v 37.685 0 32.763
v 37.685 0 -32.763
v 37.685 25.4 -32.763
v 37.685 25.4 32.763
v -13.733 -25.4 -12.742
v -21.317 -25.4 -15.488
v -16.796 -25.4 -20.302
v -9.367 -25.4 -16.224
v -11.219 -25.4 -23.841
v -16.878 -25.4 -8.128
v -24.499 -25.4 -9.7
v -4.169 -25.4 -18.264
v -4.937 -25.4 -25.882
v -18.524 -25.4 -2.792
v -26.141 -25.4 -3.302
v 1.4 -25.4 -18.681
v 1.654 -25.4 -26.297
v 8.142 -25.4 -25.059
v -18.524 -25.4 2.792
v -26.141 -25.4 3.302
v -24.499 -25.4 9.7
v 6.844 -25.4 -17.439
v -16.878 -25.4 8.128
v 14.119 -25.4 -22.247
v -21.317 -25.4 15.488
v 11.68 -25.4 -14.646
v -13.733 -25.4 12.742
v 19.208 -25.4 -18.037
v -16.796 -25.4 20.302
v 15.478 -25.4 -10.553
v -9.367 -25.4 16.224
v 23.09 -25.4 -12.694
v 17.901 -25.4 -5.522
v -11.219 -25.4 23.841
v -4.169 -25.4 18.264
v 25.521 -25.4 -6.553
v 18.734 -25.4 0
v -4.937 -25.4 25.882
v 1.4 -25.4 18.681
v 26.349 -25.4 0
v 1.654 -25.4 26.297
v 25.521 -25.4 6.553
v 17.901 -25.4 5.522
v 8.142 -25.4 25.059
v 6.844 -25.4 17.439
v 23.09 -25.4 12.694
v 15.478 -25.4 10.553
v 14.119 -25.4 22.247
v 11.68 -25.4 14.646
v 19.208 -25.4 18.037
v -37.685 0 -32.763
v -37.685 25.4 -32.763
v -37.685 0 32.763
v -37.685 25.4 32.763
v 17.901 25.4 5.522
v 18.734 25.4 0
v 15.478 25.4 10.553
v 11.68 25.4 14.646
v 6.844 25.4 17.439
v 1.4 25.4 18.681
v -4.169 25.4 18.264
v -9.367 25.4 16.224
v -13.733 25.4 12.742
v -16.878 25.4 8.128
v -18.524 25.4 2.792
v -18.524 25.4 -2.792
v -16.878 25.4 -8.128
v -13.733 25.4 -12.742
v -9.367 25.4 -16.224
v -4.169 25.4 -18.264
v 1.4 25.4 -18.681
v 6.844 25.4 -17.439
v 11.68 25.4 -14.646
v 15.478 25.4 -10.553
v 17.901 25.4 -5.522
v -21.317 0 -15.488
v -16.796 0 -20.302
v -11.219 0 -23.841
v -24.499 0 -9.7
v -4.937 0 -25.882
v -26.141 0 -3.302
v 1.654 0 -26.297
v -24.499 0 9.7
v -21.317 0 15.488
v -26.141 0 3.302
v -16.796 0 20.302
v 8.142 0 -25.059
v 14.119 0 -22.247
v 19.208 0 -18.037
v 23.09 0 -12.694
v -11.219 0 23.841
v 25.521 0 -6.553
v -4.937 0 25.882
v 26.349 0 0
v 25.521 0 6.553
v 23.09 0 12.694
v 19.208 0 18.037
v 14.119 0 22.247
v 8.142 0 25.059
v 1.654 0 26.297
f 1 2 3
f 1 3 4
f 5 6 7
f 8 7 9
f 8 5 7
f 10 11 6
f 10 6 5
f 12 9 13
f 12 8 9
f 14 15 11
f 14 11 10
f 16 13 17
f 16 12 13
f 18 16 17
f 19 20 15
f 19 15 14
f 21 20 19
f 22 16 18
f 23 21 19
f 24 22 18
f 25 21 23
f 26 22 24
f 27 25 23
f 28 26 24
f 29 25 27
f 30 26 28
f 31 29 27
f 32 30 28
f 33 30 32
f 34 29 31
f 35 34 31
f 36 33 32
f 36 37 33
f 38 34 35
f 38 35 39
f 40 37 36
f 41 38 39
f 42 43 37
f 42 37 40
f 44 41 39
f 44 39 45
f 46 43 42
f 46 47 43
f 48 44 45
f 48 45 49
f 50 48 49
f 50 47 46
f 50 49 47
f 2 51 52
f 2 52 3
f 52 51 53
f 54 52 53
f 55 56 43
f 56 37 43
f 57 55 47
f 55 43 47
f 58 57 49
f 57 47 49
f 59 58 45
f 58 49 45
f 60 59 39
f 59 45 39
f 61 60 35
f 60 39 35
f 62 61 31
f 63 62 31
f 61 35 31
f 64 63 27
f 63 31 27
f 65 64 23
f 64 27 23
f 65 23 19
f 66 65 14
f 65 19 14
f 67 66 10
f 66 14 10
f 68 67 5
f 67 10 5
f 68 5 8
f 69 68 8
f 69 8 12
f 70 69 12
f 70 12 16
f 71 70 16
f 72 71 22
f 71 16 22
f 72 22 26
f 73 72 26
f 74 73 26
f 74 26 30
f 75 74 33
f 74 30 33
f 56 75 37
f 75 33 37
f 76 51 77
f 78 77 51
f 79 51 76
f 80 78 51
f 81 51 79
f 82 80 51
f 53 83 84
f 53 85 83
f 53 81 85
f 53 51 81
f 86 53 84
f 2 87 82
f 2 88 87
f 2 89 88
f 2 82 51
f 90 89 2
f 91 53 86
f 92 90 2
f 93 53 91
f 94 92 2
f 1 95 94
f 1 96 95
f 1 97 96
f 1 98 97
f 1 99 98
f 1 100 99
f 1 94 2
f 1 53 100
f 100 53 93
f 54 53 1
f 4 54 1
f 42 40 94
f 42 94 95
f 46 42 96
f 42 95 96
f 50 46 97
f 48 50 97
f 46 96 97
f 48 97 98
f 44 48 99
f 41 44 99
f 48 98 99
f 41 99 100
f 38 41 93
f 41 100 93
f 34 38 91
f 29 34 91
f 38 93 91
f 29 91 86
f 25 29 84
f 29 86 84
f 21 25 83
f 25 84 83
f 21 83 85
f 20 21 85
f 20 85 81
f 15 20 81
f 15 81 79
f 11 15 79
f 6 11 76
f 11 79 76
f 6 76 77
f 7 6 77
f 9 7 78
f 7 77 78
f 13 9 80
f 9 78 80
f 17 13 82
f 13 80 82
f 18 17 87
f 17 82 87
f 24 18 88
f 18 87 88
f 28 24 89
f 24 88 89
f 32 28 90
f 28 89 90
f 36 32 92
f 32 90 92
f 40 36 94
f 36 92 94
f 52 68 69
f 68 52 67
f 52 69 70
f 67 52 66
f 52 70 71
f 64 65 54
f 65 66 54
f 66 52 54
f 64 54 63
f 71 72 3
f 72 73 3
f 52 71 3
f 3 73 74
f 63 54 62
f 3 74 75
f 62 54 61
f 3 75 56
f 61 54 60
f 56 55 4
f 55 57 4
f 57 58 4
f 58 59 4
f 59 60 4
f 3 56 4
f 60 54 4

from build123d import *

# Parameters (mm, degrees)
F0_W     = 75.369708
F0_H     = 65.526642
F1_DEPTH = 25.4
F2_R     = 26.349112
F3_DEPTH = 25.4
F4_R     = 18.733501
F5_DEPTH = 25.401
F6_DEPTH = 25.401


with BuildPart() as f1:
    # F0 (on Front) → F1 (new body)
    with BuildSketch(Plane.XZ):
        Rectangle(F0_W, F0_H)
    extrude(amount=-F1_DEPTH)

    # F2 (on Front) → F3 (join)
    with BuildSketch(Plane.XZ):
        Circle(F2_R)
    extrude(amount=F3_DEPTH)

    # F4 (on Front) → F5 (cut, through all)
    with BuildSketch(Plane.XZ):
        Circle(F4_R)
    extrude(amount=F5_DEPTH, mode=Mode.SUBTRACT)

    # F4 (on Front) → F6 (cut, through all)
    with BuildSketch(Plane.XZ):
        Circle(F4_R)
    extrude(amount=-F6_DEPTH, mode=Mode.SUBTRACT)


solid = f1.part
